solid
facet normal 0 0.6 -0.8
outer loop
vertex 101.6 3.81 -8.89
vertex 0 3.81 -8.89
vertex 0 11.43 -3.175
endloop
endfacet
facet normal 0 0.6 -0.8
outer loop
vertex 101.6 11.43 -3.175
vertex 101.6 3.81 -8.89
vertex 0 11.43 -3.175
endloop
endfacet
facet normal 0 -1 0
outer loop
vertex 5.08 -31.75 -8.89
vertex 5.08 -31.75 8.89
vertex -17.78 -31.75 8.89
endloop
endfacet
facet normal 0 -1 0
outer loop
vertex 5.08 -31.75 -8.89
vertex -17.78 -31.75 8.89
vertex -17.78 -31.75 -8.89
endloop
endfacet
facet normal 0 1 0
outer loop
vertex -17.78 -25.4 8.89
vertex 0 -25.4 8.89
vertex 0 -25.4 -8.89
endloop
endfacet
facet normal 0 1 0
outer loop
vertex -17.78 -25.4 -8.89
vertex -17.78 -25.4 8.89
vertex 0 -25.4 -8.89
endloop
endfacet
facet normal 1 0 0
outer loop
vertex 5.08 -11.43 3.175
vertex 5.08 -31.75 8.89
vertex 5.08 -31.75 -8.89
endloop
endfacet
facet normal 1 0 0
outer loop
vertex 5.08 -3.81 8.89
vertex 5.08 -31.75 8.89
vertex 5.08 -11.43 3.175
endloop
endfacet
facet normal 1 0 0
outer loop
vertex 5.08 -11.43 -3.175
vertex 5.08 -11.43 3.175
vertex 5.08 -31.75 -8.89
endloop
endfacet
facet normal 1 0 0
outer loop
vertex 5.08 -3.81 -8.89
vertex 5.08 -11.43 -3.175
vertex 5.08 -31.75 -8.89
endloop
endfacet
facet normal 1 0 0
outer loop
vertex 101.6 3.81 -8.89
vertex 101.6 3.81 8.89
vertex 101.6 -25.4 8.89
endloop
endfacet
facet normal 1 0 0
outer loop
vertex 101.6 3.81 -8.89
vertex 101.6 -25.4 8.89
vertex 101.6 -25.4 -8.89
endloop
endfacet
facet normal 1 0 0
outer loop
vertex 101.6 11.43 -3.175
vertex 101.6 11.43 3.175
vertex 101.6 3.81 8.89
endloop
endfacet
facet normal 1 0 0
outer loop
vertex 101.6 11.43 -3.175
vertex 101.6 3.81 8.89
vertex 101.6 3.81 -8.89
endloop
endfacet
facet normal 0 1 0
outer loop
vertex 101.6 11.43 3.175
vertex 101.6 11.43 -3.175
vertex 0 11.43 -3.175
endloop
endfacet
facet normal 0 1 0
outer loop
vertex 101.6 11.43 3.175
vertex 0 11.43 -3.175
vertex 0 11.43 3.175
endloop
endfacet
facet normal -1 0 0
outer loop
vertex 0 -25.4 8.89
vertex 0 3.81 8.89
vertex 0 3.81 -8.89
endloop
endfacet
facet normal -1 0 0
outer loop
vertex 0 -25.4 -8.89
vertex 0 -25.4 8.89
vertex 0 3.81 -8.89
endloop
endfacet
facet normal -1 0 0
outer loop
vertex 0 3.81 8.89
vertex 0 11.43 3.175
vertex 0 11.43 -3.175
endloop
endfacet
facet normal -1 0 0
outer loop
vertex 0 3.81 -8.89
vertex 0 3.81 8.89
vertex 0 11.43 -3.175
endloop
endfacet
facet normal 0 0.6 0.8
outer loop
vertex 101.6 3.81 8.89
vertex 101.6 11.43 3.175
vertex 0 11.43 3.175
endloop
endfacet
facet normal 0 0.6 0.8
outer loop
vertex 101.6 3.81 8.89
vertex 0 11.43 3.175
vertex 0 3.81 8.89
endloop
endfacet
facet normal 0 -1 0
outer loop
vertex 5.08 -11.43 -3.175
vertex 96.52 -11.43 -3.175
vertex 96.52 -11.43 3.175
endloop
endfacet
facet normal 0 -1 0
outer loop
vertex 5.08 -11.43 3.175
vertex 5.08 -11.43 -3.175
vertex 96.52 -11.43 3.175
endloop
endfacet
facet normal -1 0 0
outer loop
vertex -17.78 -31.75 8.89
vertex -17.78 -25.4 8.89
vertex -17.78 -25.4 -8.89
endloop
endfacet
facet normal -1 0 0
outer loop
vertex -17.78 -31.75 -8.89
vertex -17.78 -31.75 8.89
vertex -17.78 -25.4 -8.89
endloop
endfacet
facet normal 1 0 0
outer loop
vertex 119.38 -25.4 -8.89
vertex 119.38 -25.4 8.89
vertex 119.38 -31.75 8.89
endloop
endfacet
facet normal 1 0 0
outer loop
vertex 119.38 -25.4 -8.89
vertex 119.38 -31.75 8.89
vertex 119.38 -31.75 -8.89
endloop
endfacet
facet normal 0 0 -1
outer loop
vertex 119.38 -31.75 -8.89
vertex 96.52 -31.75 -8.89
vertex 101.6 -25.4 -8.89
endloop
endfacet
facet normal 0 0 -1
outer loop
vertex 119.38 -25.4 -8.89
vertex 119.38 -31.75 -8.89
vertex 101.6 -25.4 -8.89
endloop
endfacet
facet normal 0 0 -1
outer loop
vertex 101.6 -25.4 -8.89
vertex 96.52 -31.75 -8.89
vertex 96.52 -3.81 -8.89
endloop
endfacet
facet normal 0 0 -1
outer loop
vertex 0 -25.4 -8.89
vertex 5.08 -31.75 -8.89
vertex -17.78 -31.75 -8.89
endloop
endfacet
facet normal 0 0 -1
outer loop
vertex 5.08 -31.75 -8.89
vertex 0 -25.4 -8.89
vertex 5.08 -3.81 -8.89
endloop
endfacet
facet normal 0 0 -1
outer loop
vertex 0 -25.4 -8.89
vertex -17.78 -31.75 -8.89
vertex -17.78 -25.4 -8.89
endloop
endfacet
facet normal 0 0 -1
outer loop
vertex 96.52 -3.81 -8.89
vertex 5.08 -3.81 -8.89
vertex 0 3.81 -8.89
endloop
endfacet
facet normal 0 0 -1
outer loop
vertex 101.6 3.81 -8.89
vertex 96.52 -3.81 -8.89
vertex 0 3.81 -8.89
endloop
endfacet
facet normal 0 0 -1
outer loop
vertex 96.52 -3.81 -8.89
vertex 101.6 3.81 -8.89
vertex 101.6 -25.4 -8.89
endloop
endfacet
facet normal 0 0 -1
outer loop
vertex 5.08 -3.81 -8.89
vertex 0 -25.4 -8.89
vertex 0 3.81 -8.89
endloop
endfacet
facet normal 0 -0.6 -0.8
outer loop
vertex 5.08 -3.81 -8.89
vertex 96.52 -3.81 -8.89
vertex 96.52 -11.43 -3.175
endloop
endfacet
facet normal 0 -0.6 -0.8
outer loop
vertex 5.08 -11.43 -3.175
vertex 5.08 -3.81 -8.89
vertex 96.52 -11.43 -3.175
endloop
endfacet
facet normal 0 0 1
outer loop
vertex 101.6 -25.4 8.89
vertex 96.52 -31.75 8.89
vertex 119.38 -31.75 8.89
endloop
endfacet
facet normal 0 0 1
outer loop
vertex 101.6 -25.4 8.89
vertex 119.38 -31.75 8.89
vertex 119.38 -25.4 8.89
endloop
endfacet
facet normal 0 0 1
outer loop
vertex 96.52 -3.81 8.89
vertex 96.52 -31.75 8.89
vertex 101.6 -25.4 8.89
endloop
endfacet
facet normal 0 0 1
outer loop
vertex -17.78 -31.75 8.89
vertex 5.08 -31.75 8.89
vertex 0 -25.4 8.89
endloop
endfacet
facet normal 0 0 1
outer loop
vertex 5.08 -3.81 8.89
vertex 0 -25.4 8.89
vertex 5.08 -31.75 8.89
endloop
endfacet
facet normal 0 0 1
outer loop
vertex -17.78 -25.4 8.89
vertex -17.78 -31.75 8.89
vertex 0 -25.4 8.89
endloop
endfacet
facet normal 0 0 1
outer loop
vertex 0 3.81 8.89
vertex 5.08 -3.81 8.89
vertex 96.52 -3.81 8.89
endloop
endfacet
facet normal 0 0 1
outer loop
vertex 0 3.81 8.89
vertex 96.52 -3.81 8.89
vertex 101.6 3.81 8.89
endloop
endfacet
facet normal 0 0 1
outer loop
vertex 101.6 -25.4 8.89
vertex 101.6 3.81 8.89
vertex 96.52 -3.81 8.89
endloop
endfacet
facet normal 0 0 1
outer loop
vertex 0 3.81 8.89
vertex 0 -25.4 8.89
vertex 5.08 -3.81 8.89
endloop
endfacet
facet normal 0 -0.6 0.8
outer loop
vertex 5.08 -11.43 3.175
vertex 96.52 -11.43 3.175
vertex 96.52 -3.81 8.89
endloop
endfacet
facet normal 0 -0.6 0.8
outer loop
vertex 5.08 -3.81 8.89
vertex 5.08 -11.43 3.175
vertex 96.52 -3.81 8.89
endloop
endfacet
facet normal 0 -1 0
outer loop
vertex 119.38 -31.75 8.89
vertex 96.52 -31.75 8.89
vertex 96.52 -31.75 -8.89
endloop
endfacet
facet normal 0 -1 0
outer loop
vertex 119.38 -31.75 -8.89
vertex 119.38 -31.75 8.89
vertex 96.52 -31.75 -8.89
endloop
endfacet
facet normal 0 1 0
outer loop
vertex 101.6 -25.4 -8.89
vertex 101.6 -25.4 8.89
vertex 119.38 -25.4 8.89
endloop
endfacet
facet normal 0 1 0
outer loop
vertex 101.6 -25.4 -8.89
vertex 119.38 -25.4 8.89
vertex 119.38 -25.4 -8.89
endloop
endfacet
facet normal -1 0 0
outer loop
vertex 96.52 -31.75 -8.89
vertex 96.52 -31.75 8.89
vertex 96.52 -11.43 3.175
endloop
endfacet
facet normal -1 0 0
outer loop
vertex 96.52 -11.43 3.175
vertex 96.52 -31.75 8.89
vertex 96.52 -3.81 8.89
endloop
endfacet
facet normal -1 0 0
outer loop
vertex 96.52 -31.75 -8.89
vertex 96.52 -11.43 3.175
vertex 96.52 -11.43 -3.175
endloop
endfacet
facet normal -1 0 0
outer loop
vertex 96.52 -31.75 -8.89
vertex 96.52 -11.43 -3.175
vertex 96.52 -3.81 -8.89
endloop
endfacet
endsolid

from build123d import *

# Parameters (mm, degrees)
BOSS_EXTRUDE1_DEPTH = 5.08
BOSS_EXTRUDE2_DEPTH = 50.8
SKETCH1_4_W         = 17.78
SKETCH1_4_H         = 6.35
BOSS_EXTRUDE3_DEPTH = 17.78


with BuildPart() as part:
    # Sketch1 → Boss-Extrude1 (new body)
    with BuildSketch(Plane(origin=(0, 0, 0), x_dir=(0, 0, -1), z_dir=(1, 0, 0))):
        Polygon((-8.89, 3.81), (-8.89, -31.75), (8.89, -31.75), (8.89, 3.81), (3.175, 11.43), (-3.175, 11.43), align=None)
    extrude(amount=BOSS_EXTRUDE1_DEPTH)

    # Sketch1<3> → Boss-Extrude2 (add)
    with BuildSketch(Plane(origin=(0, 0, 0), x_dir=(0, 0, -1), z_dir=(1, 0, 0))):
        Polygon((3.175, -11.43), (8.89, -3.81), (8.89, 3.81), (3.175, 11.43), (-3.175, 11.43), (-8.89, 3.81), (-8.89, -3.81), (-3.175, -11.43), align=None)
    extrude(amount=BOSS_EXTRUDE2_DEPTH)

    # Sketch1<4> → Boss-Extrude3 (add)
    with BuildSketch(Plane(origin=(0, 0, 0), x_dir=(0, 0, -1), z_dir=(1, 0, 0))):
        with Locations((0, -28.575)):
            Rectangle(SKETCH1_4_W, SKETCH1_4_H)
    extrude(amount=-BOSS_EXTRUDE3_DEPTH)

    # Mirror1: part across plane


with BuildPart() as part_1:
    add(part.part)
    add(part.part.mirror(Plane(origin=(50.8, 0, 0), x_dir=(0, 0, 1), z_dir=(1, 0, 0))))


solid = part_1.part
